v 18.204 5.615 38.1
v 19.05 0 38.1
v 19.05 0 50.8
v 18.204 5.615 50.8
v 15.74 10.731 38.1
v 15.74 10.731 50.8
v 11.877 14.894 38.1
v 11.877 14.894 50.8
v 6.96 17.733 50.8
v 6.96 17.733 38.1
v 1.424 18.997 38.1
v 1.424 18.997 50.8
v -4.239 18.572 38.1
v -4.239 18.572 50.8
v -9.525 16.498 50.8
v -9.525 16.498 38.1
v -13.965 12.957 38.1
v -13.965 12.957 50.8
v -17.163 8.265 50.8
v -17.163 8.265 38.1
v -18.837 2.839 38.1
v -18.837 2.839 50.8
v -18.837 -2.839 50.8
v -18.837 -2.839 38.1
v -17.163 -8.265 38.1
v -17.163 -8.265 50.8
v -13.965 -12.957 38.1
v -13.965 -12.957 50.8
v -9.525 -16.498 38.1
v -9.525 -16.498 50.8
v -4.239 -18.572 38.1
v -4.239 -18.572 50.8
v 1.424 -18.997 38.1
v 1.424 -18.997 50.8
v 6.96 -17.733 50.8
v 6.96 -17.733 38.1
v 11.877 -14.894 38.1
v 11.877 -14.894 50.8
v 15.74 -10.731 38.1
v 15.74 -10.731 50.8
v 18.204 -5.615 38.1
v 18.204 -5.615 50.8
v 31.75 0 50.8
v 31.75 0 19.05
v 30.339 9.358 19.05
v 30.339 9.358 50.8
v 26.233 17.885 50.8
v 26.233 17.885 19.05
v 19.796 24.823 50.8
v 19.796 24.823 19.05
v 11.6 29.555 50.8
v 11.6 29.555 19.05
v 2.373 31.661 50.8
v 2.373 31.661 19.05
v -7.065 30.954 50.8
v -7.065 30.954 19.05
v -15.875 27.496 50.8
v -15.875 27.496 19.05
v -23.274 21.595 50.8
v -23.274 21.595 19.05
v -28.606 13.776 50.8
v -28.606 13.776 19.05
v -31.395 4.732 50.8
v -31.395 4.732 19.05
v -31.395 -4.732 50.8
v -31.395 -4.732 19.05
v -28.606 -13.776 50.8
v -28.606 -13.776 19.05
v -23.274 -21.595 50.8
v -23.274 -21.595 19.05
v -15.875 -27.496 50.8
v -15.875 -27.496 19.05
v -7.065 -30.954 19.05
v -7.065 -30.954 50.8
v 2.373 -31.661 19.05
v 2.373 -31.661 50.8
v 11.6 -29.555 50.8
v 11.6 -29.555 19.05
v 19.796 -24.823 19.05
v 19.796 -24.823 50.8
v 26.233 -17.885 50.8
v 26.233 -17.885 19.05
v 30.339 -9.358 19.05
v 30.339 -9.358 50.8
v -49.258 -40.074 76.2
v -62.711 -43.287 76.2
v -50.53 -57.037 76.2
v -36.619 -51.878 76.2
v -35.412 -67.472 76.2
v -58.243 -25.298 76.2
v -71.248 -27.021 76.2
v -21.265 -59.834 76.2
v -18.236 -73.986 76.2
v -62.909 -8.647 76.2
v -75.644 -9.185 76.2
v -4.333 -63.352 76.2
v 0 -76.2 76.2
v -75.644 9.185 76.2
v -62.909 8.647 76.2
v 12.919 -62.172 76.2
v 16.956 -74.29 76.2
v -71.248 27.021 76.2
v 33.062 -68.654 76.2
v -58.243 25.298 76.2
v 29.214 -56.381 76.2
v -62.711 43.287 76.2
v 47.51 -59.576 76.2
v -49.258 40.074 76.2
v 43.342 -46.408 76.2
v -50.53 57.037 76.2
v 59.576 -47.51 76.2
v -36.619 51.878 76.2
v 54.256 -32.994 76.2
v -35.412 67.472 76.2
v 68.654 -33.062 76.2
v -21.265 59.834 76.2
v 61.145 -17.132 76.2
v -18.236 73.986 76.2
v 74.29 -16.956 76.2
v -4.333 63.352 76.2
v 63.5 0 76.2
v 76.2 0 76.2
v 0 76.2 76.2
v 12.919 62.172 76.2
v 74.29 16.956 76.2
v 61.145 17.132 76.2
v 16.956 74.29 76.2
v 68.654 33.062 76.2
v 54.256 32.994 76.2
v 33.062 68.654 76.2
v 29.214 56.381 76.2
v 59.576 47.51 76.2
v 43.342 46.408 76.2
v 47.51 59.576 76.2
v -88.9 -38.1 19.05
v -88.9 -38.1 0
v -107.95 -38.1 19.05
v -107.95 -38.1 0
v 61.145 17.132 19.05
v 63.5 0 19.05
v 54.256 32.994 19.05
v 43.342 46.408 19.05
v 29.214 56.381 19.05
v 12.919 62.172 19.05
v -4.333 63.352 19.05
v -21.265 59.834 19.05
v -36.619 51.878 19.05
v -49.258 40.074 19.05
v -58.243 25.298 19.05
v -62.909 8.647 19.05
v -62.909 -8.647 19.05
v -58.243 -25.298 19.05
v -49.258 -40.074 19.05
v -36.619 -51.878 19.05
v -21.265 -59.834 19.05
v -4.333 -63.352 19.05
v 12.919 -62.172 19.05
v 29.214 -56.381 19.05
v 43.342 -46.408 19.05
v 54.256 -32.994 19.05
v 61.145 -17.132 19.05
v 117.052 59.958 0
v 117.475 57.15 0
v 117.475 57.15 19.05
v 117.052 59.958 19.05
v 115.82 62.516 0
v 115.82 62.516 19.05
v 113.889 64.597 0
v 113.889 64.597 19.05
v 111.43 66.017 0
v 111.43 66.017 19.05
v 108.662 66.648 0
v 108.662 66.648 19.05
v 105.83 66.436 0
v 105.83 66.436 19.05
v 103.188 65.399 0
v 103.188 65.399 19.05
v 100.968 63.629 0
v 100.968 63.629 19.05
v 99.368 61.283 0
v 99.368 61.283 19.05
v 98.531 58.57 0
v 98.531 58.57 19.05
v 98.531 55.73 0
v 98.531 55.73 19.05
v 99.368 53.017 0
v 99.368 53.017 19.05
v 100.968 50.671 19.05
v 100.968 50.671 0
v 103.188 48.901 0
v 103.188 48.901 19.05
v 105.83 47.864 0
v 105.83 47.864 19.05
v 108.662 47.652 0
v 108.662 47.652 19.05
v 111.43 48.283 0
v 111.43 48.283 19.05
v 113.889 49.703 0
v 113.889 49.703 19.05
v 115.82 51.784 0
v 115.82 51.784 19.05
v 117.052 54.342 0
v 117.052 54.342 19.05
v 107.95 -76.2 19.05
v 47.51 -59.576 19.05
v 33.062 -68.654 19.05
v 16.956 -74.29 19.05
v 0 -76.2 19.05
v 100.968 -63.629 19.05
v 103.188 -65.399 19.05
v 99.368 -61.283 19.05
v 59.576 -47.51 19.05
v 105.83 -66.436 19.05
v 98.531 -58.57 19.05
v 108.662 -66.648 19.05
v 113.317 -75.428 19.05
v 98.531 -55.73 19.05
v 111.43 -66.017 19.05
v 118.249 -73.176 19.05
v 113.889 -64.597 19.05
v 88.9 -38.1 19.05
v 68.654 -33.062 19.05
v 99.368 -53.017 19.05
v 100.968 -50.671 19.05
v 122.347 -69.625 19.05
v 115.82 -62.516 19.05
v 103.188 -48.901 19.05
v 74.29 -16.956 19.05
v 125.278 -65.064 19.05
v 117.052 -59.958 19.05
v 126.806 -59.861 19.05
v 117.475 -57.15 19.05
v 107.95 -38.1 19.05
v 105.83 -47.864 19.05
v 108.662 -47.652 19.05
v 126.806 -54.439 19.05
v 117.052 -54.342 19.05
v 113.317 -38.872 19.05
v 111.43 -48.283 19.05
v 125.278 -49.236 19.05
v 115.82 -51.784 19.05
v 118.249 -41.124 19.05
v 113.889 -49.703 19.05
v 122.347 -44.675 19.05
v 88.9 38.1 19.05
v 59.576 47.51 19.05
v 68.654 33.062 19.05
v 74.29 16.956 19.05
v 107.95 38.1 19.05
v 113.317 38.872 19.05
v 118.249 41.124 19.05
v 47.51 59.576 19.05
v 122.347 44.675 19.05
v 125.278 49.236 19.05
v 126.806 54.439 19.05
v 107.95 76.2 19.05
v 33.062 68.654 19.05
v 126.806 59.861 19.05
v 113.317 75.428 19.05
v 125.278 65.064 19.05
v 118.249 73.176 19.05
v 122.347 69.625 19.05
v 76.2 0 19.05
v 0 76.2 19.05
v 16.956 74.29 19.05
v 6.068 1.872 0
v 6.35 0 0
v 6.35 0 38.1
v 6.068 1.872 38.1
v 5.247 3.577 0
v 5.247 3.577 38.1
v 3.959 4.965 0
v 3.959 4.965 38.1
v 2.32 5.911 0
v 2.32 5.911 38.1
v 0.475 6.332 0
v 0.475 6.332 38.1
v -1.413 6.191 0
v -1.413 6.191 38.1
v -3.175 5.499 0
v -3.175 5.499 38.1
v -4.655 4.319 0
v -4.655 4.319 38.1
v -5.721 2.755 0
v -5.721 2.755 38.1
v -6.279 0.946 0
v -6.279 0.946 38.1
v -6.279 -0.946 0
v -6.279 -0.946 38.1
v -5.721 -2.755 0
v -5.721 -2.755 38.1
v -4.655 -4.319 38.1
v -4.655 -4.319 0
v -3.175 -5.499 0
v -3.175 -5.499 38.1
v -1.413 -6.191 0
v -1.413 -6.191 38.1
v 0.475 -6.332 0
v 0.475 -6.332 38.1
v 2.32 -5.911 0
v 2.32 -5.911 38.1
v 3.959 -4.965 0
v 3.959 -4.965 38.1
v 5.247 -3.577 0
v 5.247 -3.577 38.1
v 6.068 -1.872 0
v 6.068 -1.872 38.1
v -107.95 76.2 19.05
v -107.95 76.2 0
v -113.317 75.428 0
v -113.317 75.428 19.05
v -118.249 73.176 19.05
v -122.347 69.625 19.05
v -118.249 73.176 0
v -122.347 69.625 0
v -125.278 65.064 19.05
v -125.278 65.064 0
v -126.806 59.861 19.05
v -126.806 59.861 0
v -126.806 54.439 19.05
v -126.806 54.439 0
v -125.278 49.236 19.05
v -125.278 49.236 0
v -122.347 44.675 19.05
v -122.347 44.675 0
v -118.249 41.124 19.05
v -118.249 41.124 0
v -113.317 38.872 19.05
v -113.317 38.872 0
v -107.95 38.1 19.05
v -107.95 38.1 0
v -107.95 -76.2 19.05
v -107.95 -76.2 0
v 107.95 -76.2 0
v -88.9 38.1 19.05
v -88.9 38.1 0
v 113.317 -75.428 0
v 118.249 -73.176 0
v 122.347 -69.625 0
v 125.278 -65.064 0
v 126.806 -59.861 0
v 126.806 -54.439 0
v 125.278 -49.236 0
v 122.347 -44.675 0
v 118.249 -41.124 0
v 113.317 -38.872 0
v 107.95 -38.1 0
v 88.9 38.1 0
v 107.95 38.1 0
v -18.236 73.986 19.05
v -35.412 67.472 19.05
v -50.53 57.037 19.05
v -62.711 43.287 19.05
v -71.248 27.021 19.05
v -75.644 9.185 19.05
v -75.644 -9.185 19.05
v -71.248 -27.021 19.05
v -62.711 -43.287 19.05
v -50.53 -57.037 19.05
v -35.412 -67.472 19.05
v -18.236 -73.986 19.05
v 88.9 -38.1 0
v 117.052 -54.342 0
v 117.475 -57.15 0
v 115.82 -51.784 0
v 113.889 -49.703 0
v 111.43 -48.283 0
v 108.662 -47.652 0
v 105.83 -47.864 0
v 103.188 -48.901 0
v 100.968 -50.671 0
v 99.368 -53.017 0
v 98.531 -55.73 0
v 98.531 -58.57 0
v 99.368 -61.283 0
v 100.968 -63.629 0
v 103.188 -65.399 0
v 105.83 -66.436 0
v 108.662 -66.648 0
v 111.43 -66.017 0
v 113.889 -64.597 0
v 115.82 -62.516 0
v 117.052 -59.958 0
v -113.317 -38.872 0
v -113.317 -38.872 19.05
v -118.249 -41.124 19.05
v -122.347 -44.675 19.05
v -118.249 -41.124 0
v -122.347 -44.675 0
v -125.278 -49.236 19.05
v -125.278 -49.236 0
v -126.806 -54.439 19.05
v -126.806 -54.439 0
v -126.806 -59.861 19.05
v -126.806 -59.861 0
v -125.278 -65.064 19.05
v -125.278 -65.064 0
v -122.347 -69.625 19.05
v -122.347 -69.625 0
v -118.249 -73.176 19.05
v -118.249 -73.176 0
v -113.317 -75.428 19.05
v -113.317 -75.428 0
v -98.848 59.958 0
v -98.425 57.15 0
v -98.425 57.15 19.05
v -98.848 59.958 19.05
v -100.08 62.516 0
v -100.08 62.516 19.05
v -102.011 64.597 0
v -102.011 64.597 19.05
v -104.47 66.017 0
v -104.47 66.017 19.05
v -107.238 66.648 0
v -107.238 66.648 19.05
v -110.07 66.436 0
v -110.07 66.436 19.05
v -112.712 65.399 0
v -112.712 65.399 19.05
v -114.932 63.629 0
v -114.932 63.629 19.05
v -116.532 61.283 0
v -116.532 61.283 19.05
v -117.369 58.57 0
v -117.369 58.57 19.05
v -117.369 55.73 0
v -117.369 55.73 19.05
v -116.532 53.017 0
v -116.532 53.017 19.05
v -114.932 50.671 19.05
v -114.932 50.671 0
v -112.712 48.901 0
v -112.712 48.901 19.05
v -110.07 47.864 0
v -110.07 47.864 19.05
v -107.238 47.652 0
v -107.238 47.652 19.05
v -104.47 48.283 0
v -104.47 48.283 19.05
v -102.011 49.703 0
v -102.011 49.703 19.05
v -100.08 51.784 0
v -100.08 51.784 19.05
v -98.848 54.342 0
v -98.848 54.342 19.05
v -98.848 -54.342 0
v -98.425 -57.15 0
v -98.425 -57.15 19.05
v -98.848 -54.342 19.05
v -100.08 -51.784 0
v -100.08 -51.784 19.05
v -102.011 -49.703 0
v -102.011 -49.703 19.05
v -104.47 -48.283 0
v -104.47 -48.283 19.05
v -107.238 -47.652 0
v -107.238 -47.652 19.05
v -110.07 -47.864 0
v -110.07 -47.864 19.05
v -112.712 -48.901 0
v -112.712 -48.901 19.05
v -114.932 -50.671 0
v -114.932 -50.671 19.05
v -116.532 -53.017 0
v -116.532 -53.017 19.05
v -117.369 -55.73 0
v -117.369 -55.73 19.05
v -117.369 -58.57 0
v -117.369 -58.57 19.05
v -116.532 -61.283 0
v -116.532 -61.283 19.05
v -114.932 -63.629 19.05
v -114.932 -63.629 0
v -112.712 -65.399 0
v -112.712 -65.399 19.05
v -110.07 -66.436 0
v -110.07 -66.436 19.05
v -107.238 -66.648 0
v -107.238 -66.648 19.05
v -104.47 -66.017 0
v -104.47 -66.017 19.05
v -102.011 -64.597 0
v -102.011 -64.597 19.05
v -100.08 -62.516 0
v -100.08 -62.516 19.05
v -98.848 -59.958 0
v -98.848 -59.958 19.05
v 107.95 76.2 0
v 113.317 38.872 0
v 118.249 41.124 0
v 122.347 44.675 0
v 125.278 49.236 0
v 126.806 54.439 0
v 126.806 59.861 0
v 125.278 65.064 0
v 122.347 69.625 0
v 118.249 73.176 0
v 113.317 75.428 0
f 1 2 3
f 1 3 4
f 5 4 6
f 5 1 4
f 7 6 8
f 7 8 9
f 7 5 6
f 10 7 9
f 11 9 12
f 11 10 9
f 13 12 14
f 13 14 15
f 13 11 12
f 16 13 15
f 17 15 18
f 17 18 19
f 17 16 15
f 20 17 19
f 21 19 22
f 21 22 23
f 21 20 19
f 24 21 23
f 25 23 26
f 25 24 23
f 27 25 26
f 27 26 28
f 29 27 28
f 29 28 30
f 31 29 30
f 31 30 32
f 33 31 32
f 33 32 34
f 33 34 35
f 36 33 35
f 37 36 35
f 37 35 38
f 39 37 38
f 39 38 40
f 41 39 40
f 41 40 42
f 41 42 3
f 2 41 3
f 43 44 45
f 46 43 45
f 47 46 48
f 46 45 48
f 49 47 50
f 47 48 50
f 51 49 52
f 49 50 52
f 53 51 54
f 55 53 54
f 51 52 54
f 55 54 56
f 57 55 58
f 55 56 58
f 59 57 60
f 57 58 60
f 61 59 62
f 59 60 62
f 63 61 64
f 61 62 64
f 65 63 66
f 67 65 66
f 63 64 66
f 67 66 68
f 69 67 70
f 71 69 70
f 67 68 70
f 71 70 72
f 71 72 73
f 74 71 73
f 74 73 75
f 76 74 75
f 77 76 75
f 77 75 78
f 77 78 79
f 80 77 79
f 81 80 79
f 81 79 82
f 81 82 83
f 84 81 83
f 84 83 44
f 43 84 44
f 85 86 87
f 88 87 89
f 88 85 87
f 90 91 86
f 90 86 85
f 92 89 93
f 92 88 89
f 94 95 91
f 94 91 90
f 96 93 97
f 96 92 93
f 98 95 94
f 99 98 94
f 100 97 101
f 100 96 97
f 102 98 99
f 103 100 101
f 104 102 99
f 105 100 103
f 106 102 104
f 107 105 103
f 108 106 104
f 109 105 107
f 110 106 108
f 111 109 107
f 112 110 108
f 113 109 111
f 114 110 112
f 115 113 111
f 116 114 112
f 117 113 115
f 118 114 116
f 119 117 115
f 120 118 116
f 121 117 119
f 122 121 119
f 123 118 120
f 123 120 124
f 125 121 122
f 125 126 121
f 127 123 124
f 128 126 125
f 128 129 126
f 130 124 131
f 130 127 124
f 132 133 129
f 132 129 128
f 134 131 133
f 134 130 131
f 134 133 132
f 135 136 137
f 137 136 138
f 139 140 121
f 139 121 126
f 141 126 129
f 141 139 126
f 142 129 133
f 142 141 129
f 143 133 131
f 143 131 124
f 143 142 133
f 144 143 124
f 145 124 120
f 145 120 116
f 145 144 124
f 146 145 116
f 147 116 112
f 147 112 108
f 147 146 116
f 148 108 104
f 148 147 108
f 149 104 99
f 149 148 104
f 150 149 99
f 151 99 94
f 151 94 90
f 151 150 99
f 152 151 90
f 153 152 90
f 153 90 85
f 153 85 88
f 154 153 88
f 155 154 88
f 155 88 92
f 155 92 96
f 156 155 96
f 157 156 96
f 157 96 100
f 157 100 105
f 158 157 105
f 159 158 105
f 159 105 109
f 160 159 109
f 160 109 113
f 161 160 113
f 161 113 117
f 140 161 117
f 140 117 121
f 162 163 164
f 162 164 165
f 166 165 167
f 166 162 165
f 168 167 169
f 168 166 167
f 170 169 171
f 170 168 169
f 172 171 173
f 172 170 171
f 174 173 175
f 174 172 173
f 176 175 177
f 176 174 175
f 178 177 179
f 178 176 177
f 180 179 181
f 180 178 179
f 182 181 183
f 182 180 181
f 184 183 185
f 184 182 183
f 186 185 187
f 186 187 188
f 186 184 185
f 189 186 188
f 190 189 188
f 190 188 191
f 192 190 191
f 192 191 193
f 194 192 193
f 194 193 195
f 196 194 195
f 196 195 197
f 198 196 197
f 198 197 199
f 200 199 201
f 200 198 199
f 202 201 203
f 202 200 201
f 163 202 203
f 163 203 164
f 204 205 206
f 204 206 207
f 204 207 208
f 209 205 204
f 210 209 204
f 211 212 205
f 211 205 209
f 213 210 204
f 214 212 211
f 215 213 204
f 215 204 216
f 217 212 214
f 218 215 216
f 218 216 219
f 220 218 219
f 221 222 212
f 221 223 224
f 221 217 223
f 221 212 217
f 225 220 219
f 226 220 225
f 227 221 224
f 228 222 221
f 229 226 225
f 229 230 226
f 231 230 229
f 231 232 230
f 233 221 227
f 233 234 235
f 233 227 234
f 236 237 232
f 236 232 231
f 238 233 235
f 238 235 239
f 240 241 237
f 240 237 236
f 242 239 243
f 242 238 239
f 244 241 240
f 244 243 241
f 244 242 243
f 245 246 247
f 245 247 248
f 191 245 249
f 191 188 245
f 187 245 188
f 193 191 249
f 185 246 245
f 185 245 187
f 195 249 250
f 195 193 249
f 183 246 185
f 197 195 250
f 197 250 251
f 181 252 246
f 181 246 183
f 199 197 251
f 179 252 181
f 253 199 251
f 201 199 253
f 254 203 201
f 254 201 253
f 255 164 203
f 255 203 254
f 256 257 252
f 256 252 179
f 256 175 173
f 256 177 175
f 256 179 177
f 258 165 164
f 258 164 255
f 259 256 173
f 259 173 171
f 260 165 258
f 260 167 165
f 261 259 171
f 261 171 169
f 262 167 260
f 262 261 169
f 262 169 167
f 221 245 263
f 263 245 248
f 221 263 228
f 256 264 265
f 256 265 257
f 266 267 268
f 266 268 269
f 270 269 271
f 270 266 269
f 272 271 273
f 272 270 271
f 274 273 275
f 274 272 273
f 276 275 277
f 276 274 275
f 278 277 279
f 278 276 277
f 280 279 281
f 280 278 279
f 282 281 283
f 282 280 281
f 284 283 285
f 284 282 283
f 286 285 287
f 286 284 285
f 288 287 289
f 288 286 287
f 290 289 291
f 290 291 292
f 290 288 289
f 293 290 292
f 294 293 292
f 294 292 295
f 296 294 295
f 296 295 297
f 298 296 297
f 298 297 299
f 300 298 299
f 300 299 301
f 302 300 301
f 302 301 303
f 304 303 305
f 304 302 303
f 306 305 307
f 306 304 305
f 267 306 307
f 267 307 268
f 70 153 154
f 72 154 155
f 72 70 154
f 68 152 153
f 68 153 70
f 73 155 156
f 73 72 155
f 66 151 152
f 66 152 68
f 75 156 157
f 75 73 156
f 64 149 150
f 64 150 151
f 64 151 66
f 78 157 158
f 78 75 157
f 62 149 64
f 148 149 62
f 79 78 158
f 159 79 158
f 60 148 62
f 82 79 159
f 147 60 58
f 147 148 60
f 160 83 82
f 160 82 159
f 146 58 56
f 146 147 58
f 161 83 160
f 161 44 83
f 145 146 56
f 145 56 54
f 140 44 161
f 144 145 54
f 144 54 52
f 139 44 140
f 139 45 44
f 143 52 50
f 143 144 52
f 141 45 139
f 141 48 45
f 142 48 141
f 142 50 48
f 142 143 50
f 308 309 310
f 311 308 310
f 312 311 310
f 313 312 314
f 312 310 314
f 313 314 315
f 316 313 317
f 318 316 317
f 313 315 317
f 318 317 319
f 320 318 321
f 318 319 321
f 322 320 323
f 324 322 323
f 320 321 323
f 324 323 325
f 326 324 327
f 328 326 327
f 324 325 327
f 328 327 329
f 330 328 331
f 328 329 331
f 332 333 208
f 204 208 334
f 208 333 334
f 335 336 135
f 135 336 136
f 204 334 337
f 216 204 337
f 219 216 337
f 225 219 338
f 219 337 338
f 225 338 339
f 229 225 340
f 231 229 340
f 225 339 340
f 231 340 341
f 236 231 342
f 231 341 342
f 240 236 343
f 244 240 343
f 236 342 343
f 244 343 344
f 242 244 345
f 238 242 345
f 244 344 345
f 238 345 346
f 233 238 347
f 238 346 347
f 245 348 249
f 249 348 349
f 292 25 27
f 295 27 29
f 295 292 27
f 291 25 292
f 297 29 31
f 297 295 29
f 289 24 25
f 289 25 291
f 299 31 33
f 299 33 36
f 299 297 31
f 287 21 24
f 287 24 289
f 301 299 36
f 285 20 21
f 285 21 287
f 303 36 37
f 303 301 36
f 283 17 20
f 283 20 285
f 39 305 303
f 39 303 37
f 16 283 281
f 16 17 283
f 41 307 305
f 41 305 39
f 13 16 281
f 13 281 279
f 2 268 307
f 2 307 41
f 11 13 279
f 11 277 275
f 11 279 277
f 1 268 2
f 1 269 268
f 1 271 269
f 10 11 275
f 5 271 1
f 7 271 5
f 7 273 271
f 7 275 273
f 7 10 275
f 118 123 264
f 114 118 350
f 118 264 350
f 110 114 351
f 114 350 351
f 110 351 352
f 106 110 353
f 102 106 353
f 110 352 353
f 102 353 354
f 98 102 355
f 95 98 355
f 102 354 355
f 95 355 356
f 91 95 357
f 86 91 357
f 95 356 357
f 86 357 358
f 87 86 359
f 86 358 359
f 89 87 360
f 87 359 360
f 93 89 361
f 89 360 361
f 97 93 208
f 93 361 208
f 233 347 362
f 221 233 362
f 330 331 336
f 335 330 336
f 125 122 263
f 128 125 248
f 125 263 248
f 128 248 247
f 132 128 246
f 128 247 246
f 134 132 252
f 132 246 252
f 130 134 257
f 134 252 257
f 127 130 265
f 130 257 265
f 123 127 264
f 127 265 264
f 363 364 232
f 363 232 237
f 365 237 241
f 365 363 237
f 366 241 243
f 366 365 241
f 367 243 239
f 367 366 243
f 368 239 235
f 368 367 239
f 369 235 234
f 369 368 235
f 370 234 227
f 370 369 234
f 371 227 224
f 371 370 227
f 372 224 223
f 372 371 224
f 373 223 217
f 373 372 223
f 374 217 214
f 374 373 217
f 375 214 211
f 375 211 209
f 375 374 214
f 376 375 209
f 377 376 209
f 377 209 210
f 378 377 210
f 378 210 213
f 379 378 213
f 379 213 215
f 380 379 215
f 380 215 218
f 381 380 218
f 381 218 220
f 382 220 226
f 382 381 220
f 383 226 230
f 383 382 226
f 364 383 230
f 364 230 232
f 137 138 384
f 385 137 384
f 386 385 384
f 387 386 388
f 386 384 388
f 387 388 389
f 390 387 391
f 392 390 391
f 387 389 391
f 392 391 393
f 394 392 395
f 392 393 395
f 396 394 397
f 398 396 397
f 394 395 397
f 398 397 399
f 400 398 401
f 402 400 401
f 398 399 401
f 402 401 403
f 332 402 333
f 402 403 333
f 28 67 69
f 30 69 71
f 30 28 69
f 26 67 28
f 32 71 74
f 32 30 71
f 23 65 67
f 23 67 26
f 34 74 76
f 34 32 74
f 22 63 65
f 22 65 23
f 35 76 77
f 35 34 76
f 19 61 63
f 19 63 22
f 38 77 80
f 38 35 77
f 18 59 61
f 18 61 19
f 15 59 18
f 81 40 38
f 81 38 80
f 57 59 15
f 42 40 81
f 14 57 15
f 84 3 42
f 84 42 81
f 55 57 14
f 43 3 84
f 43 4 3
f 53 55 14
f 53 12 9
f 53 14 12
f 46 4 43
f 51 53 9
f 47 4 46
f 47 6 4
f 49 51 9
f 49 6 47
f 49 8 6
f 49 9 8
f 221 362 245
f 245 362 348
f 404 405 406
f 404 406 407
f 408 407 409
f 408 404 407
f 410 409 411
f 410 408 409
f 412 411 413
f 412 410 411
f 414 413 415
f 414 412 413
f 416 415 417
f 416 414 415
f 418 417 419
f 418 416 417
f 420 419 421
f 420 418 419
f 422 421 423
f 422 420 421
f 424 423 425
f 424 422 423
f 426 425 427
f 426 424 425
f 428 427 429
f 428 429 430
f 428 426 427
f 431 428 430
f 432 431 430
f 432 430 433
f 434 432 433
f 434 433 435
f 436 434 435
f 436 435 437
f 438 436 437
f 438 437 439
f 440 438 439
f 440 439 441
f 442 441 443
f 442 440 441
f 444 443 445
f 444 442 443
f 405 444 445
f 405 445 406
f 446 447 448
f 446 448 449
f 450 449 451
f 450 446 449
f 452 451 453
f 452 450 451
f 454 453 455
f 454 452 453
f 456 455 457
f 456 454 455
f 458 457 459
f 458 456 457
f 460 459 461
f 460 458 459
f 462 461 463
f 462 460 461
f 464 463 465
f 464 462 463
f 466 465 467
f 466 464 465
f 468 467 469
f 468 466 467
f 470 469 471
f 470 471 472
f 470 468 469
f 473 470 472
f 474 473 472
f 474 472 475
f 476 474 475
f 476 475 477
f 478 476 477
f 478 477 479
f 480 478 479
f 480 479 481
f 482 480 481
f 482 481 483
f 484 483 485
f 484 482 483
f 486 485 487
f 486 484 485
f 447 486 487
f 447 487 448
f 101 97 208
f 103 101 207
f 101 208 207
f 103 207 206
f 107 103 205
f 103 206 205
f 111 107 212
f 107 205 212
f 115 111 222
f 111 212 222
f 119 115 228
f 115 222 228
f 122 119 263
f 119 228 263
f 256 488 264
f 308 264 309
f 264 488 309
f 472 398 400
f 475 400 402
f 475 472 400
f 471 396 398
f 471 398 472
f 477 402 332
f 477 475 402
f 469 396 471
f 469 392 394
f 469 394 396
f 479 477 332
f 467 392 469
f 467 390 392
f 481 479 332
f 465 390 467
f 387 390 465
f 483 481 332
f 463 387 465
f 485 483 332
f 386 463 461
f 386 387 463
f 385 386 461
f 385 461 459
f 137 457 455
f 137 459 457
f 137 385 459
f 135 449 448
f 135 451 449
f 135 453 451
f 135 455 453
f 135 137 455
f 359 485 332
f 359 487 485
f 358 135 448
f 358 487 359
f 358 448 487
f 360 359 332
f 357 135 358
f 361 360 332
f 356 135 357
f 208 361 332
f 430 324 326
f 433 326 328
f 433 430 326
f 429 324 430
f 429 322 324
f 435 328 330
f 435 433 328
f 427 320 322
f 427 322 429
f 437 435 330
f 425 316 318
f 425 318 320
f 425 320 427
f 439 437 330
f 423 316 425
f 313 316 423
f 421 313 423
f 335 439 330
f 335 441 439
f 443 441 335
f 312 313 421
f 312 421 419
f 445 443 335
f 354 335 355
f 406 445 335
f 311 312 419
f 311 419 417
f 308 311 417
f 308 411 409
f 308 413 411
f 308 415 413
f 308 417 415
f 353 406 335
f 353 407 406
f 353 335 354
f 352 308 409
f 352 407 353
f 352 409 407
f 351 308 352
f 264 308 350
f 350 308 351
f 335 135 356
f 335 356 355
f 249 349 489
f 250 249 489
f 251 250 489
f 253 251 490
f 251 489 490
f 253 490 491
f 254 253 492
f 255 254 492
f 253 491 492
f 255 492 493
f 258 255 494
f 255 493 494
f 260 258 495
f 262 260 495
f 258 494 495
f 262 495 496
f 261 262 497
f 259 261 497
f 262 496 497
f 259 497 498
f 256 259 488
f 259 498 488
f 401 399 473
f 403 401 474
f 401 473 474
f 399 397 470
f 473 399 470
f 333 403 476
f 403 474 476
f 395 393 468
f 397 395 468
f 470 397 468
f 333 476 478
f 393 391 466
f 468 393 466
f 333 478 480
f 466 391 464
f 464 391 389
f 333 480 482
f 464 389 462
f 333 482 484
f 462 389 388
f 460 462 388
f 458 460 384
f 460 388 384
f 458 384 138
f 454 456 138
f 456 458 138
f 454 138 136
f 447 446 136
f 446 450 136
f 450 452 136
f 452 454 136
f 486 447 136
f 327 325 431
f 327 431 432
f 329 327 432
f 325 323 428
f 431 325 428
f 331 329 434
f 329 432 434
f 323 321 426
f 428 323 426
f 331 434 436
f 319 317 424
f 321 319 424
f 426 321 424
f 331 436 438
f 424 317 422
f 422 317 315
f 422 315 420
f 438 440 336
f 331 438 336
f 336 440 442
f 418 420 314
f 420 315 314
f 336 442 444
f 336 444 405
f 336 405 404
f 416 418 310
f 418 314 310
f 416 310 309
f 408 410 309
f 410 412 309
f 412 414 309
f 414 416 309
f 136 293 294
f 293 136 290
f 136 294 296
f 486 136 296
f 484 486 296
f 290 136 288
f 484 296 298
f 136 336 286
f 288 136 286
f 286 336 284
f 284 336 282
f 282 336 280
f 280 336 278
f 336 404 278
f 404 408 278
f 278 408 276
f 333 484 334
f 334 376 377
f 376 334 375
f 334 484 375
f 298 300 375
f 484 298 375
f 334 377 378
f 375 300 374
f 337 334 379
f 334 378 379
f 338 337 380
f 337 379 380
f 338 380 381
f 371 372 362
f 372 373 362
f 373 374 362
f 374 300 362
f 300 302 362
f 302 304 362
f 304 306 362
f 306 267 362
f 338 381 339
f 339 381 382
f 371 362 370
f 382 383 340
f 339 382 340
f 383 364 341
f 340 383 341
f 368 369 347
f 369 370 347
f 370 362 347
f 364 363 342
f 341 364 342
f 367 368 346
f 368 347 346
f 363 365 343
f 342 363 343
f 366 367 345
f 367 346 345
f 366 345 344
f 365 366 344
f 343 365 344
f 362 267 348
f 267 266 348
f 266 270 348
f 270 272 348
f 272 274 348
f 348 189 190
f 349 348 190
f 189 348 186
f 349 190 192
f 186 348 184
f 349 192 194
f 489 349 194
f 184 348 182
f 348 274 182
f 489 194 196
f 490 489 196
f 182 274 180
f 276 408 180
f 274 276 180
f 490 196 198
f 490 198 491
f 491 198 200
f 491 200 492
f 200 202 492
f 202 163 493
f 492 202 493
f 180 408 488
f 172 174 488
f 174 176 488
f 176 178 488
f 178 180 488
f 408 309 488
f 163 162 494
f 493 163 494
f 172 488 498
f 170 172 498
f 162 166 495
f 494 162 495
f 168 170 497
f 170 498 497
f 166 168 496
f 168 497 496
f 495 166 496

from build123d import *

# Parameters (mm, degrees)
F0_R     = 9.525
F1_DEPTH = 19.05
F0_R_2   = 63.5
F2_DEPTH = 76.2
F0_R_3   = 31.75
F3_DEPTH = 19.05
F0_R_4   = 19.05
F4_DEPTH = 50.8
F0_R_5   = 6.35
F5_DEPTH = 38.1


with BuildPart() as f1:
    # F0 (on Top) → F1 (new body)
    with BuildSketch(Plane.XY):
        with BuildLine():
            ThreePointArc((0, -76.2), (-76.2, 0), (0, 76.2))
            Line((0, 76.2), (-107.95, 76.2))
            ThreePointArc((-107.95, 76.2), (-127, 57.15), (-107.95, 38.1))
            Line((-107.95, 38.1), (-88.9, 38.1))
            Line((-88.9, 38.1), (-88.9, -38.1))
            Line((-88.9, -38.1), (-107.95, -38.1))
            ThreePointArc((-107.95, -38.1), (-127, -57.15), (-107.95, -76.2))
            Line((-107.95, -76.2), (0, -76.2))
        make_face()
        with Locations((-107.95, -57.15)):
            Circle(F0_R, mode=Mode.SUBTRACT)
        with Locations((-107.95, 57.15)):
            Circle(F0_R, mode=Mode.SUBTRACT)
        with BuildLine():
            ThreePointArc((0, 76.2), (53.881537, 53.881537), (76.2, 0))
            ThreePointArc((76.2, 0), (53.881537, -53.881537), (0, -76.2))
            Line((0, -76.2), (107.95, -76.2))
            ThreePointArc((107.95, -76.2), (127, -57.15), (107.95, -38.1))
            Line((107.95, -38.1), (88.9, -38.1))
            Line((88.9, -38.1), (88.9, 38.1))
            Line((88.9, 38.1), (107.95, 38.1))
            ThreePointArc((107.95, 38.1), (127, 57.15), (107.95, 76.2))
            Line((107.95, 76.2), (0, 76.2))
        make_face()
        with Locations((107.95, -57.15)):
            Circle(F0_R, mode=Mode.SUBTRACT)
        with Locations((107.95, 57.15)):
            Circle(F0_R, mode=Mode.SUBTRACT)
    extrude(amount=F1_DEPTH)

    # F0 (on Top) → F2 (join)
    with BuildSketch(Plane.XY):
        with BuildLine():
            ThreePointArc((0, -76.2), (53.881537, -53.881537), (76.2, 0))
            ThreePointArc((76.2, 0), (53.881537, 53.881537), (0, 76.2))
            ThreePointArc((0, 76.2), (-76.2, 0), (0, -76.2))
        make_face()
        Circle(F0_R_2, mode=Mode.SUBTRACT)
    extrude(amount=F2_DEPTH)

    # F0 (on Top) → F3 (join)
    with BuildSketch(Plane.XY):
        Circle(F0_R_2)
        Circle(F0_R_3, mode=Mode.SUBTRACT)
    extrude(amount=F3_DEPTH)

    # F0 (on Top) → F4 (join)
    with BuildSketch(Plane.XY):
        Circle(F0_R_3)
        Circle(F0_R_4, mode=Mode.SUBTRACT)
    extrude(amount=F4_DEPTH)

    # F0 (on Top) → F5 (join)
    with BuildSketch(Plane.XY):
        Circle(F0_R_4)
        Circle(F0_R_5, mode=Mode.SUBTRACT)
    extrude(amount=F5_DEPTH)


solid = f1.part
